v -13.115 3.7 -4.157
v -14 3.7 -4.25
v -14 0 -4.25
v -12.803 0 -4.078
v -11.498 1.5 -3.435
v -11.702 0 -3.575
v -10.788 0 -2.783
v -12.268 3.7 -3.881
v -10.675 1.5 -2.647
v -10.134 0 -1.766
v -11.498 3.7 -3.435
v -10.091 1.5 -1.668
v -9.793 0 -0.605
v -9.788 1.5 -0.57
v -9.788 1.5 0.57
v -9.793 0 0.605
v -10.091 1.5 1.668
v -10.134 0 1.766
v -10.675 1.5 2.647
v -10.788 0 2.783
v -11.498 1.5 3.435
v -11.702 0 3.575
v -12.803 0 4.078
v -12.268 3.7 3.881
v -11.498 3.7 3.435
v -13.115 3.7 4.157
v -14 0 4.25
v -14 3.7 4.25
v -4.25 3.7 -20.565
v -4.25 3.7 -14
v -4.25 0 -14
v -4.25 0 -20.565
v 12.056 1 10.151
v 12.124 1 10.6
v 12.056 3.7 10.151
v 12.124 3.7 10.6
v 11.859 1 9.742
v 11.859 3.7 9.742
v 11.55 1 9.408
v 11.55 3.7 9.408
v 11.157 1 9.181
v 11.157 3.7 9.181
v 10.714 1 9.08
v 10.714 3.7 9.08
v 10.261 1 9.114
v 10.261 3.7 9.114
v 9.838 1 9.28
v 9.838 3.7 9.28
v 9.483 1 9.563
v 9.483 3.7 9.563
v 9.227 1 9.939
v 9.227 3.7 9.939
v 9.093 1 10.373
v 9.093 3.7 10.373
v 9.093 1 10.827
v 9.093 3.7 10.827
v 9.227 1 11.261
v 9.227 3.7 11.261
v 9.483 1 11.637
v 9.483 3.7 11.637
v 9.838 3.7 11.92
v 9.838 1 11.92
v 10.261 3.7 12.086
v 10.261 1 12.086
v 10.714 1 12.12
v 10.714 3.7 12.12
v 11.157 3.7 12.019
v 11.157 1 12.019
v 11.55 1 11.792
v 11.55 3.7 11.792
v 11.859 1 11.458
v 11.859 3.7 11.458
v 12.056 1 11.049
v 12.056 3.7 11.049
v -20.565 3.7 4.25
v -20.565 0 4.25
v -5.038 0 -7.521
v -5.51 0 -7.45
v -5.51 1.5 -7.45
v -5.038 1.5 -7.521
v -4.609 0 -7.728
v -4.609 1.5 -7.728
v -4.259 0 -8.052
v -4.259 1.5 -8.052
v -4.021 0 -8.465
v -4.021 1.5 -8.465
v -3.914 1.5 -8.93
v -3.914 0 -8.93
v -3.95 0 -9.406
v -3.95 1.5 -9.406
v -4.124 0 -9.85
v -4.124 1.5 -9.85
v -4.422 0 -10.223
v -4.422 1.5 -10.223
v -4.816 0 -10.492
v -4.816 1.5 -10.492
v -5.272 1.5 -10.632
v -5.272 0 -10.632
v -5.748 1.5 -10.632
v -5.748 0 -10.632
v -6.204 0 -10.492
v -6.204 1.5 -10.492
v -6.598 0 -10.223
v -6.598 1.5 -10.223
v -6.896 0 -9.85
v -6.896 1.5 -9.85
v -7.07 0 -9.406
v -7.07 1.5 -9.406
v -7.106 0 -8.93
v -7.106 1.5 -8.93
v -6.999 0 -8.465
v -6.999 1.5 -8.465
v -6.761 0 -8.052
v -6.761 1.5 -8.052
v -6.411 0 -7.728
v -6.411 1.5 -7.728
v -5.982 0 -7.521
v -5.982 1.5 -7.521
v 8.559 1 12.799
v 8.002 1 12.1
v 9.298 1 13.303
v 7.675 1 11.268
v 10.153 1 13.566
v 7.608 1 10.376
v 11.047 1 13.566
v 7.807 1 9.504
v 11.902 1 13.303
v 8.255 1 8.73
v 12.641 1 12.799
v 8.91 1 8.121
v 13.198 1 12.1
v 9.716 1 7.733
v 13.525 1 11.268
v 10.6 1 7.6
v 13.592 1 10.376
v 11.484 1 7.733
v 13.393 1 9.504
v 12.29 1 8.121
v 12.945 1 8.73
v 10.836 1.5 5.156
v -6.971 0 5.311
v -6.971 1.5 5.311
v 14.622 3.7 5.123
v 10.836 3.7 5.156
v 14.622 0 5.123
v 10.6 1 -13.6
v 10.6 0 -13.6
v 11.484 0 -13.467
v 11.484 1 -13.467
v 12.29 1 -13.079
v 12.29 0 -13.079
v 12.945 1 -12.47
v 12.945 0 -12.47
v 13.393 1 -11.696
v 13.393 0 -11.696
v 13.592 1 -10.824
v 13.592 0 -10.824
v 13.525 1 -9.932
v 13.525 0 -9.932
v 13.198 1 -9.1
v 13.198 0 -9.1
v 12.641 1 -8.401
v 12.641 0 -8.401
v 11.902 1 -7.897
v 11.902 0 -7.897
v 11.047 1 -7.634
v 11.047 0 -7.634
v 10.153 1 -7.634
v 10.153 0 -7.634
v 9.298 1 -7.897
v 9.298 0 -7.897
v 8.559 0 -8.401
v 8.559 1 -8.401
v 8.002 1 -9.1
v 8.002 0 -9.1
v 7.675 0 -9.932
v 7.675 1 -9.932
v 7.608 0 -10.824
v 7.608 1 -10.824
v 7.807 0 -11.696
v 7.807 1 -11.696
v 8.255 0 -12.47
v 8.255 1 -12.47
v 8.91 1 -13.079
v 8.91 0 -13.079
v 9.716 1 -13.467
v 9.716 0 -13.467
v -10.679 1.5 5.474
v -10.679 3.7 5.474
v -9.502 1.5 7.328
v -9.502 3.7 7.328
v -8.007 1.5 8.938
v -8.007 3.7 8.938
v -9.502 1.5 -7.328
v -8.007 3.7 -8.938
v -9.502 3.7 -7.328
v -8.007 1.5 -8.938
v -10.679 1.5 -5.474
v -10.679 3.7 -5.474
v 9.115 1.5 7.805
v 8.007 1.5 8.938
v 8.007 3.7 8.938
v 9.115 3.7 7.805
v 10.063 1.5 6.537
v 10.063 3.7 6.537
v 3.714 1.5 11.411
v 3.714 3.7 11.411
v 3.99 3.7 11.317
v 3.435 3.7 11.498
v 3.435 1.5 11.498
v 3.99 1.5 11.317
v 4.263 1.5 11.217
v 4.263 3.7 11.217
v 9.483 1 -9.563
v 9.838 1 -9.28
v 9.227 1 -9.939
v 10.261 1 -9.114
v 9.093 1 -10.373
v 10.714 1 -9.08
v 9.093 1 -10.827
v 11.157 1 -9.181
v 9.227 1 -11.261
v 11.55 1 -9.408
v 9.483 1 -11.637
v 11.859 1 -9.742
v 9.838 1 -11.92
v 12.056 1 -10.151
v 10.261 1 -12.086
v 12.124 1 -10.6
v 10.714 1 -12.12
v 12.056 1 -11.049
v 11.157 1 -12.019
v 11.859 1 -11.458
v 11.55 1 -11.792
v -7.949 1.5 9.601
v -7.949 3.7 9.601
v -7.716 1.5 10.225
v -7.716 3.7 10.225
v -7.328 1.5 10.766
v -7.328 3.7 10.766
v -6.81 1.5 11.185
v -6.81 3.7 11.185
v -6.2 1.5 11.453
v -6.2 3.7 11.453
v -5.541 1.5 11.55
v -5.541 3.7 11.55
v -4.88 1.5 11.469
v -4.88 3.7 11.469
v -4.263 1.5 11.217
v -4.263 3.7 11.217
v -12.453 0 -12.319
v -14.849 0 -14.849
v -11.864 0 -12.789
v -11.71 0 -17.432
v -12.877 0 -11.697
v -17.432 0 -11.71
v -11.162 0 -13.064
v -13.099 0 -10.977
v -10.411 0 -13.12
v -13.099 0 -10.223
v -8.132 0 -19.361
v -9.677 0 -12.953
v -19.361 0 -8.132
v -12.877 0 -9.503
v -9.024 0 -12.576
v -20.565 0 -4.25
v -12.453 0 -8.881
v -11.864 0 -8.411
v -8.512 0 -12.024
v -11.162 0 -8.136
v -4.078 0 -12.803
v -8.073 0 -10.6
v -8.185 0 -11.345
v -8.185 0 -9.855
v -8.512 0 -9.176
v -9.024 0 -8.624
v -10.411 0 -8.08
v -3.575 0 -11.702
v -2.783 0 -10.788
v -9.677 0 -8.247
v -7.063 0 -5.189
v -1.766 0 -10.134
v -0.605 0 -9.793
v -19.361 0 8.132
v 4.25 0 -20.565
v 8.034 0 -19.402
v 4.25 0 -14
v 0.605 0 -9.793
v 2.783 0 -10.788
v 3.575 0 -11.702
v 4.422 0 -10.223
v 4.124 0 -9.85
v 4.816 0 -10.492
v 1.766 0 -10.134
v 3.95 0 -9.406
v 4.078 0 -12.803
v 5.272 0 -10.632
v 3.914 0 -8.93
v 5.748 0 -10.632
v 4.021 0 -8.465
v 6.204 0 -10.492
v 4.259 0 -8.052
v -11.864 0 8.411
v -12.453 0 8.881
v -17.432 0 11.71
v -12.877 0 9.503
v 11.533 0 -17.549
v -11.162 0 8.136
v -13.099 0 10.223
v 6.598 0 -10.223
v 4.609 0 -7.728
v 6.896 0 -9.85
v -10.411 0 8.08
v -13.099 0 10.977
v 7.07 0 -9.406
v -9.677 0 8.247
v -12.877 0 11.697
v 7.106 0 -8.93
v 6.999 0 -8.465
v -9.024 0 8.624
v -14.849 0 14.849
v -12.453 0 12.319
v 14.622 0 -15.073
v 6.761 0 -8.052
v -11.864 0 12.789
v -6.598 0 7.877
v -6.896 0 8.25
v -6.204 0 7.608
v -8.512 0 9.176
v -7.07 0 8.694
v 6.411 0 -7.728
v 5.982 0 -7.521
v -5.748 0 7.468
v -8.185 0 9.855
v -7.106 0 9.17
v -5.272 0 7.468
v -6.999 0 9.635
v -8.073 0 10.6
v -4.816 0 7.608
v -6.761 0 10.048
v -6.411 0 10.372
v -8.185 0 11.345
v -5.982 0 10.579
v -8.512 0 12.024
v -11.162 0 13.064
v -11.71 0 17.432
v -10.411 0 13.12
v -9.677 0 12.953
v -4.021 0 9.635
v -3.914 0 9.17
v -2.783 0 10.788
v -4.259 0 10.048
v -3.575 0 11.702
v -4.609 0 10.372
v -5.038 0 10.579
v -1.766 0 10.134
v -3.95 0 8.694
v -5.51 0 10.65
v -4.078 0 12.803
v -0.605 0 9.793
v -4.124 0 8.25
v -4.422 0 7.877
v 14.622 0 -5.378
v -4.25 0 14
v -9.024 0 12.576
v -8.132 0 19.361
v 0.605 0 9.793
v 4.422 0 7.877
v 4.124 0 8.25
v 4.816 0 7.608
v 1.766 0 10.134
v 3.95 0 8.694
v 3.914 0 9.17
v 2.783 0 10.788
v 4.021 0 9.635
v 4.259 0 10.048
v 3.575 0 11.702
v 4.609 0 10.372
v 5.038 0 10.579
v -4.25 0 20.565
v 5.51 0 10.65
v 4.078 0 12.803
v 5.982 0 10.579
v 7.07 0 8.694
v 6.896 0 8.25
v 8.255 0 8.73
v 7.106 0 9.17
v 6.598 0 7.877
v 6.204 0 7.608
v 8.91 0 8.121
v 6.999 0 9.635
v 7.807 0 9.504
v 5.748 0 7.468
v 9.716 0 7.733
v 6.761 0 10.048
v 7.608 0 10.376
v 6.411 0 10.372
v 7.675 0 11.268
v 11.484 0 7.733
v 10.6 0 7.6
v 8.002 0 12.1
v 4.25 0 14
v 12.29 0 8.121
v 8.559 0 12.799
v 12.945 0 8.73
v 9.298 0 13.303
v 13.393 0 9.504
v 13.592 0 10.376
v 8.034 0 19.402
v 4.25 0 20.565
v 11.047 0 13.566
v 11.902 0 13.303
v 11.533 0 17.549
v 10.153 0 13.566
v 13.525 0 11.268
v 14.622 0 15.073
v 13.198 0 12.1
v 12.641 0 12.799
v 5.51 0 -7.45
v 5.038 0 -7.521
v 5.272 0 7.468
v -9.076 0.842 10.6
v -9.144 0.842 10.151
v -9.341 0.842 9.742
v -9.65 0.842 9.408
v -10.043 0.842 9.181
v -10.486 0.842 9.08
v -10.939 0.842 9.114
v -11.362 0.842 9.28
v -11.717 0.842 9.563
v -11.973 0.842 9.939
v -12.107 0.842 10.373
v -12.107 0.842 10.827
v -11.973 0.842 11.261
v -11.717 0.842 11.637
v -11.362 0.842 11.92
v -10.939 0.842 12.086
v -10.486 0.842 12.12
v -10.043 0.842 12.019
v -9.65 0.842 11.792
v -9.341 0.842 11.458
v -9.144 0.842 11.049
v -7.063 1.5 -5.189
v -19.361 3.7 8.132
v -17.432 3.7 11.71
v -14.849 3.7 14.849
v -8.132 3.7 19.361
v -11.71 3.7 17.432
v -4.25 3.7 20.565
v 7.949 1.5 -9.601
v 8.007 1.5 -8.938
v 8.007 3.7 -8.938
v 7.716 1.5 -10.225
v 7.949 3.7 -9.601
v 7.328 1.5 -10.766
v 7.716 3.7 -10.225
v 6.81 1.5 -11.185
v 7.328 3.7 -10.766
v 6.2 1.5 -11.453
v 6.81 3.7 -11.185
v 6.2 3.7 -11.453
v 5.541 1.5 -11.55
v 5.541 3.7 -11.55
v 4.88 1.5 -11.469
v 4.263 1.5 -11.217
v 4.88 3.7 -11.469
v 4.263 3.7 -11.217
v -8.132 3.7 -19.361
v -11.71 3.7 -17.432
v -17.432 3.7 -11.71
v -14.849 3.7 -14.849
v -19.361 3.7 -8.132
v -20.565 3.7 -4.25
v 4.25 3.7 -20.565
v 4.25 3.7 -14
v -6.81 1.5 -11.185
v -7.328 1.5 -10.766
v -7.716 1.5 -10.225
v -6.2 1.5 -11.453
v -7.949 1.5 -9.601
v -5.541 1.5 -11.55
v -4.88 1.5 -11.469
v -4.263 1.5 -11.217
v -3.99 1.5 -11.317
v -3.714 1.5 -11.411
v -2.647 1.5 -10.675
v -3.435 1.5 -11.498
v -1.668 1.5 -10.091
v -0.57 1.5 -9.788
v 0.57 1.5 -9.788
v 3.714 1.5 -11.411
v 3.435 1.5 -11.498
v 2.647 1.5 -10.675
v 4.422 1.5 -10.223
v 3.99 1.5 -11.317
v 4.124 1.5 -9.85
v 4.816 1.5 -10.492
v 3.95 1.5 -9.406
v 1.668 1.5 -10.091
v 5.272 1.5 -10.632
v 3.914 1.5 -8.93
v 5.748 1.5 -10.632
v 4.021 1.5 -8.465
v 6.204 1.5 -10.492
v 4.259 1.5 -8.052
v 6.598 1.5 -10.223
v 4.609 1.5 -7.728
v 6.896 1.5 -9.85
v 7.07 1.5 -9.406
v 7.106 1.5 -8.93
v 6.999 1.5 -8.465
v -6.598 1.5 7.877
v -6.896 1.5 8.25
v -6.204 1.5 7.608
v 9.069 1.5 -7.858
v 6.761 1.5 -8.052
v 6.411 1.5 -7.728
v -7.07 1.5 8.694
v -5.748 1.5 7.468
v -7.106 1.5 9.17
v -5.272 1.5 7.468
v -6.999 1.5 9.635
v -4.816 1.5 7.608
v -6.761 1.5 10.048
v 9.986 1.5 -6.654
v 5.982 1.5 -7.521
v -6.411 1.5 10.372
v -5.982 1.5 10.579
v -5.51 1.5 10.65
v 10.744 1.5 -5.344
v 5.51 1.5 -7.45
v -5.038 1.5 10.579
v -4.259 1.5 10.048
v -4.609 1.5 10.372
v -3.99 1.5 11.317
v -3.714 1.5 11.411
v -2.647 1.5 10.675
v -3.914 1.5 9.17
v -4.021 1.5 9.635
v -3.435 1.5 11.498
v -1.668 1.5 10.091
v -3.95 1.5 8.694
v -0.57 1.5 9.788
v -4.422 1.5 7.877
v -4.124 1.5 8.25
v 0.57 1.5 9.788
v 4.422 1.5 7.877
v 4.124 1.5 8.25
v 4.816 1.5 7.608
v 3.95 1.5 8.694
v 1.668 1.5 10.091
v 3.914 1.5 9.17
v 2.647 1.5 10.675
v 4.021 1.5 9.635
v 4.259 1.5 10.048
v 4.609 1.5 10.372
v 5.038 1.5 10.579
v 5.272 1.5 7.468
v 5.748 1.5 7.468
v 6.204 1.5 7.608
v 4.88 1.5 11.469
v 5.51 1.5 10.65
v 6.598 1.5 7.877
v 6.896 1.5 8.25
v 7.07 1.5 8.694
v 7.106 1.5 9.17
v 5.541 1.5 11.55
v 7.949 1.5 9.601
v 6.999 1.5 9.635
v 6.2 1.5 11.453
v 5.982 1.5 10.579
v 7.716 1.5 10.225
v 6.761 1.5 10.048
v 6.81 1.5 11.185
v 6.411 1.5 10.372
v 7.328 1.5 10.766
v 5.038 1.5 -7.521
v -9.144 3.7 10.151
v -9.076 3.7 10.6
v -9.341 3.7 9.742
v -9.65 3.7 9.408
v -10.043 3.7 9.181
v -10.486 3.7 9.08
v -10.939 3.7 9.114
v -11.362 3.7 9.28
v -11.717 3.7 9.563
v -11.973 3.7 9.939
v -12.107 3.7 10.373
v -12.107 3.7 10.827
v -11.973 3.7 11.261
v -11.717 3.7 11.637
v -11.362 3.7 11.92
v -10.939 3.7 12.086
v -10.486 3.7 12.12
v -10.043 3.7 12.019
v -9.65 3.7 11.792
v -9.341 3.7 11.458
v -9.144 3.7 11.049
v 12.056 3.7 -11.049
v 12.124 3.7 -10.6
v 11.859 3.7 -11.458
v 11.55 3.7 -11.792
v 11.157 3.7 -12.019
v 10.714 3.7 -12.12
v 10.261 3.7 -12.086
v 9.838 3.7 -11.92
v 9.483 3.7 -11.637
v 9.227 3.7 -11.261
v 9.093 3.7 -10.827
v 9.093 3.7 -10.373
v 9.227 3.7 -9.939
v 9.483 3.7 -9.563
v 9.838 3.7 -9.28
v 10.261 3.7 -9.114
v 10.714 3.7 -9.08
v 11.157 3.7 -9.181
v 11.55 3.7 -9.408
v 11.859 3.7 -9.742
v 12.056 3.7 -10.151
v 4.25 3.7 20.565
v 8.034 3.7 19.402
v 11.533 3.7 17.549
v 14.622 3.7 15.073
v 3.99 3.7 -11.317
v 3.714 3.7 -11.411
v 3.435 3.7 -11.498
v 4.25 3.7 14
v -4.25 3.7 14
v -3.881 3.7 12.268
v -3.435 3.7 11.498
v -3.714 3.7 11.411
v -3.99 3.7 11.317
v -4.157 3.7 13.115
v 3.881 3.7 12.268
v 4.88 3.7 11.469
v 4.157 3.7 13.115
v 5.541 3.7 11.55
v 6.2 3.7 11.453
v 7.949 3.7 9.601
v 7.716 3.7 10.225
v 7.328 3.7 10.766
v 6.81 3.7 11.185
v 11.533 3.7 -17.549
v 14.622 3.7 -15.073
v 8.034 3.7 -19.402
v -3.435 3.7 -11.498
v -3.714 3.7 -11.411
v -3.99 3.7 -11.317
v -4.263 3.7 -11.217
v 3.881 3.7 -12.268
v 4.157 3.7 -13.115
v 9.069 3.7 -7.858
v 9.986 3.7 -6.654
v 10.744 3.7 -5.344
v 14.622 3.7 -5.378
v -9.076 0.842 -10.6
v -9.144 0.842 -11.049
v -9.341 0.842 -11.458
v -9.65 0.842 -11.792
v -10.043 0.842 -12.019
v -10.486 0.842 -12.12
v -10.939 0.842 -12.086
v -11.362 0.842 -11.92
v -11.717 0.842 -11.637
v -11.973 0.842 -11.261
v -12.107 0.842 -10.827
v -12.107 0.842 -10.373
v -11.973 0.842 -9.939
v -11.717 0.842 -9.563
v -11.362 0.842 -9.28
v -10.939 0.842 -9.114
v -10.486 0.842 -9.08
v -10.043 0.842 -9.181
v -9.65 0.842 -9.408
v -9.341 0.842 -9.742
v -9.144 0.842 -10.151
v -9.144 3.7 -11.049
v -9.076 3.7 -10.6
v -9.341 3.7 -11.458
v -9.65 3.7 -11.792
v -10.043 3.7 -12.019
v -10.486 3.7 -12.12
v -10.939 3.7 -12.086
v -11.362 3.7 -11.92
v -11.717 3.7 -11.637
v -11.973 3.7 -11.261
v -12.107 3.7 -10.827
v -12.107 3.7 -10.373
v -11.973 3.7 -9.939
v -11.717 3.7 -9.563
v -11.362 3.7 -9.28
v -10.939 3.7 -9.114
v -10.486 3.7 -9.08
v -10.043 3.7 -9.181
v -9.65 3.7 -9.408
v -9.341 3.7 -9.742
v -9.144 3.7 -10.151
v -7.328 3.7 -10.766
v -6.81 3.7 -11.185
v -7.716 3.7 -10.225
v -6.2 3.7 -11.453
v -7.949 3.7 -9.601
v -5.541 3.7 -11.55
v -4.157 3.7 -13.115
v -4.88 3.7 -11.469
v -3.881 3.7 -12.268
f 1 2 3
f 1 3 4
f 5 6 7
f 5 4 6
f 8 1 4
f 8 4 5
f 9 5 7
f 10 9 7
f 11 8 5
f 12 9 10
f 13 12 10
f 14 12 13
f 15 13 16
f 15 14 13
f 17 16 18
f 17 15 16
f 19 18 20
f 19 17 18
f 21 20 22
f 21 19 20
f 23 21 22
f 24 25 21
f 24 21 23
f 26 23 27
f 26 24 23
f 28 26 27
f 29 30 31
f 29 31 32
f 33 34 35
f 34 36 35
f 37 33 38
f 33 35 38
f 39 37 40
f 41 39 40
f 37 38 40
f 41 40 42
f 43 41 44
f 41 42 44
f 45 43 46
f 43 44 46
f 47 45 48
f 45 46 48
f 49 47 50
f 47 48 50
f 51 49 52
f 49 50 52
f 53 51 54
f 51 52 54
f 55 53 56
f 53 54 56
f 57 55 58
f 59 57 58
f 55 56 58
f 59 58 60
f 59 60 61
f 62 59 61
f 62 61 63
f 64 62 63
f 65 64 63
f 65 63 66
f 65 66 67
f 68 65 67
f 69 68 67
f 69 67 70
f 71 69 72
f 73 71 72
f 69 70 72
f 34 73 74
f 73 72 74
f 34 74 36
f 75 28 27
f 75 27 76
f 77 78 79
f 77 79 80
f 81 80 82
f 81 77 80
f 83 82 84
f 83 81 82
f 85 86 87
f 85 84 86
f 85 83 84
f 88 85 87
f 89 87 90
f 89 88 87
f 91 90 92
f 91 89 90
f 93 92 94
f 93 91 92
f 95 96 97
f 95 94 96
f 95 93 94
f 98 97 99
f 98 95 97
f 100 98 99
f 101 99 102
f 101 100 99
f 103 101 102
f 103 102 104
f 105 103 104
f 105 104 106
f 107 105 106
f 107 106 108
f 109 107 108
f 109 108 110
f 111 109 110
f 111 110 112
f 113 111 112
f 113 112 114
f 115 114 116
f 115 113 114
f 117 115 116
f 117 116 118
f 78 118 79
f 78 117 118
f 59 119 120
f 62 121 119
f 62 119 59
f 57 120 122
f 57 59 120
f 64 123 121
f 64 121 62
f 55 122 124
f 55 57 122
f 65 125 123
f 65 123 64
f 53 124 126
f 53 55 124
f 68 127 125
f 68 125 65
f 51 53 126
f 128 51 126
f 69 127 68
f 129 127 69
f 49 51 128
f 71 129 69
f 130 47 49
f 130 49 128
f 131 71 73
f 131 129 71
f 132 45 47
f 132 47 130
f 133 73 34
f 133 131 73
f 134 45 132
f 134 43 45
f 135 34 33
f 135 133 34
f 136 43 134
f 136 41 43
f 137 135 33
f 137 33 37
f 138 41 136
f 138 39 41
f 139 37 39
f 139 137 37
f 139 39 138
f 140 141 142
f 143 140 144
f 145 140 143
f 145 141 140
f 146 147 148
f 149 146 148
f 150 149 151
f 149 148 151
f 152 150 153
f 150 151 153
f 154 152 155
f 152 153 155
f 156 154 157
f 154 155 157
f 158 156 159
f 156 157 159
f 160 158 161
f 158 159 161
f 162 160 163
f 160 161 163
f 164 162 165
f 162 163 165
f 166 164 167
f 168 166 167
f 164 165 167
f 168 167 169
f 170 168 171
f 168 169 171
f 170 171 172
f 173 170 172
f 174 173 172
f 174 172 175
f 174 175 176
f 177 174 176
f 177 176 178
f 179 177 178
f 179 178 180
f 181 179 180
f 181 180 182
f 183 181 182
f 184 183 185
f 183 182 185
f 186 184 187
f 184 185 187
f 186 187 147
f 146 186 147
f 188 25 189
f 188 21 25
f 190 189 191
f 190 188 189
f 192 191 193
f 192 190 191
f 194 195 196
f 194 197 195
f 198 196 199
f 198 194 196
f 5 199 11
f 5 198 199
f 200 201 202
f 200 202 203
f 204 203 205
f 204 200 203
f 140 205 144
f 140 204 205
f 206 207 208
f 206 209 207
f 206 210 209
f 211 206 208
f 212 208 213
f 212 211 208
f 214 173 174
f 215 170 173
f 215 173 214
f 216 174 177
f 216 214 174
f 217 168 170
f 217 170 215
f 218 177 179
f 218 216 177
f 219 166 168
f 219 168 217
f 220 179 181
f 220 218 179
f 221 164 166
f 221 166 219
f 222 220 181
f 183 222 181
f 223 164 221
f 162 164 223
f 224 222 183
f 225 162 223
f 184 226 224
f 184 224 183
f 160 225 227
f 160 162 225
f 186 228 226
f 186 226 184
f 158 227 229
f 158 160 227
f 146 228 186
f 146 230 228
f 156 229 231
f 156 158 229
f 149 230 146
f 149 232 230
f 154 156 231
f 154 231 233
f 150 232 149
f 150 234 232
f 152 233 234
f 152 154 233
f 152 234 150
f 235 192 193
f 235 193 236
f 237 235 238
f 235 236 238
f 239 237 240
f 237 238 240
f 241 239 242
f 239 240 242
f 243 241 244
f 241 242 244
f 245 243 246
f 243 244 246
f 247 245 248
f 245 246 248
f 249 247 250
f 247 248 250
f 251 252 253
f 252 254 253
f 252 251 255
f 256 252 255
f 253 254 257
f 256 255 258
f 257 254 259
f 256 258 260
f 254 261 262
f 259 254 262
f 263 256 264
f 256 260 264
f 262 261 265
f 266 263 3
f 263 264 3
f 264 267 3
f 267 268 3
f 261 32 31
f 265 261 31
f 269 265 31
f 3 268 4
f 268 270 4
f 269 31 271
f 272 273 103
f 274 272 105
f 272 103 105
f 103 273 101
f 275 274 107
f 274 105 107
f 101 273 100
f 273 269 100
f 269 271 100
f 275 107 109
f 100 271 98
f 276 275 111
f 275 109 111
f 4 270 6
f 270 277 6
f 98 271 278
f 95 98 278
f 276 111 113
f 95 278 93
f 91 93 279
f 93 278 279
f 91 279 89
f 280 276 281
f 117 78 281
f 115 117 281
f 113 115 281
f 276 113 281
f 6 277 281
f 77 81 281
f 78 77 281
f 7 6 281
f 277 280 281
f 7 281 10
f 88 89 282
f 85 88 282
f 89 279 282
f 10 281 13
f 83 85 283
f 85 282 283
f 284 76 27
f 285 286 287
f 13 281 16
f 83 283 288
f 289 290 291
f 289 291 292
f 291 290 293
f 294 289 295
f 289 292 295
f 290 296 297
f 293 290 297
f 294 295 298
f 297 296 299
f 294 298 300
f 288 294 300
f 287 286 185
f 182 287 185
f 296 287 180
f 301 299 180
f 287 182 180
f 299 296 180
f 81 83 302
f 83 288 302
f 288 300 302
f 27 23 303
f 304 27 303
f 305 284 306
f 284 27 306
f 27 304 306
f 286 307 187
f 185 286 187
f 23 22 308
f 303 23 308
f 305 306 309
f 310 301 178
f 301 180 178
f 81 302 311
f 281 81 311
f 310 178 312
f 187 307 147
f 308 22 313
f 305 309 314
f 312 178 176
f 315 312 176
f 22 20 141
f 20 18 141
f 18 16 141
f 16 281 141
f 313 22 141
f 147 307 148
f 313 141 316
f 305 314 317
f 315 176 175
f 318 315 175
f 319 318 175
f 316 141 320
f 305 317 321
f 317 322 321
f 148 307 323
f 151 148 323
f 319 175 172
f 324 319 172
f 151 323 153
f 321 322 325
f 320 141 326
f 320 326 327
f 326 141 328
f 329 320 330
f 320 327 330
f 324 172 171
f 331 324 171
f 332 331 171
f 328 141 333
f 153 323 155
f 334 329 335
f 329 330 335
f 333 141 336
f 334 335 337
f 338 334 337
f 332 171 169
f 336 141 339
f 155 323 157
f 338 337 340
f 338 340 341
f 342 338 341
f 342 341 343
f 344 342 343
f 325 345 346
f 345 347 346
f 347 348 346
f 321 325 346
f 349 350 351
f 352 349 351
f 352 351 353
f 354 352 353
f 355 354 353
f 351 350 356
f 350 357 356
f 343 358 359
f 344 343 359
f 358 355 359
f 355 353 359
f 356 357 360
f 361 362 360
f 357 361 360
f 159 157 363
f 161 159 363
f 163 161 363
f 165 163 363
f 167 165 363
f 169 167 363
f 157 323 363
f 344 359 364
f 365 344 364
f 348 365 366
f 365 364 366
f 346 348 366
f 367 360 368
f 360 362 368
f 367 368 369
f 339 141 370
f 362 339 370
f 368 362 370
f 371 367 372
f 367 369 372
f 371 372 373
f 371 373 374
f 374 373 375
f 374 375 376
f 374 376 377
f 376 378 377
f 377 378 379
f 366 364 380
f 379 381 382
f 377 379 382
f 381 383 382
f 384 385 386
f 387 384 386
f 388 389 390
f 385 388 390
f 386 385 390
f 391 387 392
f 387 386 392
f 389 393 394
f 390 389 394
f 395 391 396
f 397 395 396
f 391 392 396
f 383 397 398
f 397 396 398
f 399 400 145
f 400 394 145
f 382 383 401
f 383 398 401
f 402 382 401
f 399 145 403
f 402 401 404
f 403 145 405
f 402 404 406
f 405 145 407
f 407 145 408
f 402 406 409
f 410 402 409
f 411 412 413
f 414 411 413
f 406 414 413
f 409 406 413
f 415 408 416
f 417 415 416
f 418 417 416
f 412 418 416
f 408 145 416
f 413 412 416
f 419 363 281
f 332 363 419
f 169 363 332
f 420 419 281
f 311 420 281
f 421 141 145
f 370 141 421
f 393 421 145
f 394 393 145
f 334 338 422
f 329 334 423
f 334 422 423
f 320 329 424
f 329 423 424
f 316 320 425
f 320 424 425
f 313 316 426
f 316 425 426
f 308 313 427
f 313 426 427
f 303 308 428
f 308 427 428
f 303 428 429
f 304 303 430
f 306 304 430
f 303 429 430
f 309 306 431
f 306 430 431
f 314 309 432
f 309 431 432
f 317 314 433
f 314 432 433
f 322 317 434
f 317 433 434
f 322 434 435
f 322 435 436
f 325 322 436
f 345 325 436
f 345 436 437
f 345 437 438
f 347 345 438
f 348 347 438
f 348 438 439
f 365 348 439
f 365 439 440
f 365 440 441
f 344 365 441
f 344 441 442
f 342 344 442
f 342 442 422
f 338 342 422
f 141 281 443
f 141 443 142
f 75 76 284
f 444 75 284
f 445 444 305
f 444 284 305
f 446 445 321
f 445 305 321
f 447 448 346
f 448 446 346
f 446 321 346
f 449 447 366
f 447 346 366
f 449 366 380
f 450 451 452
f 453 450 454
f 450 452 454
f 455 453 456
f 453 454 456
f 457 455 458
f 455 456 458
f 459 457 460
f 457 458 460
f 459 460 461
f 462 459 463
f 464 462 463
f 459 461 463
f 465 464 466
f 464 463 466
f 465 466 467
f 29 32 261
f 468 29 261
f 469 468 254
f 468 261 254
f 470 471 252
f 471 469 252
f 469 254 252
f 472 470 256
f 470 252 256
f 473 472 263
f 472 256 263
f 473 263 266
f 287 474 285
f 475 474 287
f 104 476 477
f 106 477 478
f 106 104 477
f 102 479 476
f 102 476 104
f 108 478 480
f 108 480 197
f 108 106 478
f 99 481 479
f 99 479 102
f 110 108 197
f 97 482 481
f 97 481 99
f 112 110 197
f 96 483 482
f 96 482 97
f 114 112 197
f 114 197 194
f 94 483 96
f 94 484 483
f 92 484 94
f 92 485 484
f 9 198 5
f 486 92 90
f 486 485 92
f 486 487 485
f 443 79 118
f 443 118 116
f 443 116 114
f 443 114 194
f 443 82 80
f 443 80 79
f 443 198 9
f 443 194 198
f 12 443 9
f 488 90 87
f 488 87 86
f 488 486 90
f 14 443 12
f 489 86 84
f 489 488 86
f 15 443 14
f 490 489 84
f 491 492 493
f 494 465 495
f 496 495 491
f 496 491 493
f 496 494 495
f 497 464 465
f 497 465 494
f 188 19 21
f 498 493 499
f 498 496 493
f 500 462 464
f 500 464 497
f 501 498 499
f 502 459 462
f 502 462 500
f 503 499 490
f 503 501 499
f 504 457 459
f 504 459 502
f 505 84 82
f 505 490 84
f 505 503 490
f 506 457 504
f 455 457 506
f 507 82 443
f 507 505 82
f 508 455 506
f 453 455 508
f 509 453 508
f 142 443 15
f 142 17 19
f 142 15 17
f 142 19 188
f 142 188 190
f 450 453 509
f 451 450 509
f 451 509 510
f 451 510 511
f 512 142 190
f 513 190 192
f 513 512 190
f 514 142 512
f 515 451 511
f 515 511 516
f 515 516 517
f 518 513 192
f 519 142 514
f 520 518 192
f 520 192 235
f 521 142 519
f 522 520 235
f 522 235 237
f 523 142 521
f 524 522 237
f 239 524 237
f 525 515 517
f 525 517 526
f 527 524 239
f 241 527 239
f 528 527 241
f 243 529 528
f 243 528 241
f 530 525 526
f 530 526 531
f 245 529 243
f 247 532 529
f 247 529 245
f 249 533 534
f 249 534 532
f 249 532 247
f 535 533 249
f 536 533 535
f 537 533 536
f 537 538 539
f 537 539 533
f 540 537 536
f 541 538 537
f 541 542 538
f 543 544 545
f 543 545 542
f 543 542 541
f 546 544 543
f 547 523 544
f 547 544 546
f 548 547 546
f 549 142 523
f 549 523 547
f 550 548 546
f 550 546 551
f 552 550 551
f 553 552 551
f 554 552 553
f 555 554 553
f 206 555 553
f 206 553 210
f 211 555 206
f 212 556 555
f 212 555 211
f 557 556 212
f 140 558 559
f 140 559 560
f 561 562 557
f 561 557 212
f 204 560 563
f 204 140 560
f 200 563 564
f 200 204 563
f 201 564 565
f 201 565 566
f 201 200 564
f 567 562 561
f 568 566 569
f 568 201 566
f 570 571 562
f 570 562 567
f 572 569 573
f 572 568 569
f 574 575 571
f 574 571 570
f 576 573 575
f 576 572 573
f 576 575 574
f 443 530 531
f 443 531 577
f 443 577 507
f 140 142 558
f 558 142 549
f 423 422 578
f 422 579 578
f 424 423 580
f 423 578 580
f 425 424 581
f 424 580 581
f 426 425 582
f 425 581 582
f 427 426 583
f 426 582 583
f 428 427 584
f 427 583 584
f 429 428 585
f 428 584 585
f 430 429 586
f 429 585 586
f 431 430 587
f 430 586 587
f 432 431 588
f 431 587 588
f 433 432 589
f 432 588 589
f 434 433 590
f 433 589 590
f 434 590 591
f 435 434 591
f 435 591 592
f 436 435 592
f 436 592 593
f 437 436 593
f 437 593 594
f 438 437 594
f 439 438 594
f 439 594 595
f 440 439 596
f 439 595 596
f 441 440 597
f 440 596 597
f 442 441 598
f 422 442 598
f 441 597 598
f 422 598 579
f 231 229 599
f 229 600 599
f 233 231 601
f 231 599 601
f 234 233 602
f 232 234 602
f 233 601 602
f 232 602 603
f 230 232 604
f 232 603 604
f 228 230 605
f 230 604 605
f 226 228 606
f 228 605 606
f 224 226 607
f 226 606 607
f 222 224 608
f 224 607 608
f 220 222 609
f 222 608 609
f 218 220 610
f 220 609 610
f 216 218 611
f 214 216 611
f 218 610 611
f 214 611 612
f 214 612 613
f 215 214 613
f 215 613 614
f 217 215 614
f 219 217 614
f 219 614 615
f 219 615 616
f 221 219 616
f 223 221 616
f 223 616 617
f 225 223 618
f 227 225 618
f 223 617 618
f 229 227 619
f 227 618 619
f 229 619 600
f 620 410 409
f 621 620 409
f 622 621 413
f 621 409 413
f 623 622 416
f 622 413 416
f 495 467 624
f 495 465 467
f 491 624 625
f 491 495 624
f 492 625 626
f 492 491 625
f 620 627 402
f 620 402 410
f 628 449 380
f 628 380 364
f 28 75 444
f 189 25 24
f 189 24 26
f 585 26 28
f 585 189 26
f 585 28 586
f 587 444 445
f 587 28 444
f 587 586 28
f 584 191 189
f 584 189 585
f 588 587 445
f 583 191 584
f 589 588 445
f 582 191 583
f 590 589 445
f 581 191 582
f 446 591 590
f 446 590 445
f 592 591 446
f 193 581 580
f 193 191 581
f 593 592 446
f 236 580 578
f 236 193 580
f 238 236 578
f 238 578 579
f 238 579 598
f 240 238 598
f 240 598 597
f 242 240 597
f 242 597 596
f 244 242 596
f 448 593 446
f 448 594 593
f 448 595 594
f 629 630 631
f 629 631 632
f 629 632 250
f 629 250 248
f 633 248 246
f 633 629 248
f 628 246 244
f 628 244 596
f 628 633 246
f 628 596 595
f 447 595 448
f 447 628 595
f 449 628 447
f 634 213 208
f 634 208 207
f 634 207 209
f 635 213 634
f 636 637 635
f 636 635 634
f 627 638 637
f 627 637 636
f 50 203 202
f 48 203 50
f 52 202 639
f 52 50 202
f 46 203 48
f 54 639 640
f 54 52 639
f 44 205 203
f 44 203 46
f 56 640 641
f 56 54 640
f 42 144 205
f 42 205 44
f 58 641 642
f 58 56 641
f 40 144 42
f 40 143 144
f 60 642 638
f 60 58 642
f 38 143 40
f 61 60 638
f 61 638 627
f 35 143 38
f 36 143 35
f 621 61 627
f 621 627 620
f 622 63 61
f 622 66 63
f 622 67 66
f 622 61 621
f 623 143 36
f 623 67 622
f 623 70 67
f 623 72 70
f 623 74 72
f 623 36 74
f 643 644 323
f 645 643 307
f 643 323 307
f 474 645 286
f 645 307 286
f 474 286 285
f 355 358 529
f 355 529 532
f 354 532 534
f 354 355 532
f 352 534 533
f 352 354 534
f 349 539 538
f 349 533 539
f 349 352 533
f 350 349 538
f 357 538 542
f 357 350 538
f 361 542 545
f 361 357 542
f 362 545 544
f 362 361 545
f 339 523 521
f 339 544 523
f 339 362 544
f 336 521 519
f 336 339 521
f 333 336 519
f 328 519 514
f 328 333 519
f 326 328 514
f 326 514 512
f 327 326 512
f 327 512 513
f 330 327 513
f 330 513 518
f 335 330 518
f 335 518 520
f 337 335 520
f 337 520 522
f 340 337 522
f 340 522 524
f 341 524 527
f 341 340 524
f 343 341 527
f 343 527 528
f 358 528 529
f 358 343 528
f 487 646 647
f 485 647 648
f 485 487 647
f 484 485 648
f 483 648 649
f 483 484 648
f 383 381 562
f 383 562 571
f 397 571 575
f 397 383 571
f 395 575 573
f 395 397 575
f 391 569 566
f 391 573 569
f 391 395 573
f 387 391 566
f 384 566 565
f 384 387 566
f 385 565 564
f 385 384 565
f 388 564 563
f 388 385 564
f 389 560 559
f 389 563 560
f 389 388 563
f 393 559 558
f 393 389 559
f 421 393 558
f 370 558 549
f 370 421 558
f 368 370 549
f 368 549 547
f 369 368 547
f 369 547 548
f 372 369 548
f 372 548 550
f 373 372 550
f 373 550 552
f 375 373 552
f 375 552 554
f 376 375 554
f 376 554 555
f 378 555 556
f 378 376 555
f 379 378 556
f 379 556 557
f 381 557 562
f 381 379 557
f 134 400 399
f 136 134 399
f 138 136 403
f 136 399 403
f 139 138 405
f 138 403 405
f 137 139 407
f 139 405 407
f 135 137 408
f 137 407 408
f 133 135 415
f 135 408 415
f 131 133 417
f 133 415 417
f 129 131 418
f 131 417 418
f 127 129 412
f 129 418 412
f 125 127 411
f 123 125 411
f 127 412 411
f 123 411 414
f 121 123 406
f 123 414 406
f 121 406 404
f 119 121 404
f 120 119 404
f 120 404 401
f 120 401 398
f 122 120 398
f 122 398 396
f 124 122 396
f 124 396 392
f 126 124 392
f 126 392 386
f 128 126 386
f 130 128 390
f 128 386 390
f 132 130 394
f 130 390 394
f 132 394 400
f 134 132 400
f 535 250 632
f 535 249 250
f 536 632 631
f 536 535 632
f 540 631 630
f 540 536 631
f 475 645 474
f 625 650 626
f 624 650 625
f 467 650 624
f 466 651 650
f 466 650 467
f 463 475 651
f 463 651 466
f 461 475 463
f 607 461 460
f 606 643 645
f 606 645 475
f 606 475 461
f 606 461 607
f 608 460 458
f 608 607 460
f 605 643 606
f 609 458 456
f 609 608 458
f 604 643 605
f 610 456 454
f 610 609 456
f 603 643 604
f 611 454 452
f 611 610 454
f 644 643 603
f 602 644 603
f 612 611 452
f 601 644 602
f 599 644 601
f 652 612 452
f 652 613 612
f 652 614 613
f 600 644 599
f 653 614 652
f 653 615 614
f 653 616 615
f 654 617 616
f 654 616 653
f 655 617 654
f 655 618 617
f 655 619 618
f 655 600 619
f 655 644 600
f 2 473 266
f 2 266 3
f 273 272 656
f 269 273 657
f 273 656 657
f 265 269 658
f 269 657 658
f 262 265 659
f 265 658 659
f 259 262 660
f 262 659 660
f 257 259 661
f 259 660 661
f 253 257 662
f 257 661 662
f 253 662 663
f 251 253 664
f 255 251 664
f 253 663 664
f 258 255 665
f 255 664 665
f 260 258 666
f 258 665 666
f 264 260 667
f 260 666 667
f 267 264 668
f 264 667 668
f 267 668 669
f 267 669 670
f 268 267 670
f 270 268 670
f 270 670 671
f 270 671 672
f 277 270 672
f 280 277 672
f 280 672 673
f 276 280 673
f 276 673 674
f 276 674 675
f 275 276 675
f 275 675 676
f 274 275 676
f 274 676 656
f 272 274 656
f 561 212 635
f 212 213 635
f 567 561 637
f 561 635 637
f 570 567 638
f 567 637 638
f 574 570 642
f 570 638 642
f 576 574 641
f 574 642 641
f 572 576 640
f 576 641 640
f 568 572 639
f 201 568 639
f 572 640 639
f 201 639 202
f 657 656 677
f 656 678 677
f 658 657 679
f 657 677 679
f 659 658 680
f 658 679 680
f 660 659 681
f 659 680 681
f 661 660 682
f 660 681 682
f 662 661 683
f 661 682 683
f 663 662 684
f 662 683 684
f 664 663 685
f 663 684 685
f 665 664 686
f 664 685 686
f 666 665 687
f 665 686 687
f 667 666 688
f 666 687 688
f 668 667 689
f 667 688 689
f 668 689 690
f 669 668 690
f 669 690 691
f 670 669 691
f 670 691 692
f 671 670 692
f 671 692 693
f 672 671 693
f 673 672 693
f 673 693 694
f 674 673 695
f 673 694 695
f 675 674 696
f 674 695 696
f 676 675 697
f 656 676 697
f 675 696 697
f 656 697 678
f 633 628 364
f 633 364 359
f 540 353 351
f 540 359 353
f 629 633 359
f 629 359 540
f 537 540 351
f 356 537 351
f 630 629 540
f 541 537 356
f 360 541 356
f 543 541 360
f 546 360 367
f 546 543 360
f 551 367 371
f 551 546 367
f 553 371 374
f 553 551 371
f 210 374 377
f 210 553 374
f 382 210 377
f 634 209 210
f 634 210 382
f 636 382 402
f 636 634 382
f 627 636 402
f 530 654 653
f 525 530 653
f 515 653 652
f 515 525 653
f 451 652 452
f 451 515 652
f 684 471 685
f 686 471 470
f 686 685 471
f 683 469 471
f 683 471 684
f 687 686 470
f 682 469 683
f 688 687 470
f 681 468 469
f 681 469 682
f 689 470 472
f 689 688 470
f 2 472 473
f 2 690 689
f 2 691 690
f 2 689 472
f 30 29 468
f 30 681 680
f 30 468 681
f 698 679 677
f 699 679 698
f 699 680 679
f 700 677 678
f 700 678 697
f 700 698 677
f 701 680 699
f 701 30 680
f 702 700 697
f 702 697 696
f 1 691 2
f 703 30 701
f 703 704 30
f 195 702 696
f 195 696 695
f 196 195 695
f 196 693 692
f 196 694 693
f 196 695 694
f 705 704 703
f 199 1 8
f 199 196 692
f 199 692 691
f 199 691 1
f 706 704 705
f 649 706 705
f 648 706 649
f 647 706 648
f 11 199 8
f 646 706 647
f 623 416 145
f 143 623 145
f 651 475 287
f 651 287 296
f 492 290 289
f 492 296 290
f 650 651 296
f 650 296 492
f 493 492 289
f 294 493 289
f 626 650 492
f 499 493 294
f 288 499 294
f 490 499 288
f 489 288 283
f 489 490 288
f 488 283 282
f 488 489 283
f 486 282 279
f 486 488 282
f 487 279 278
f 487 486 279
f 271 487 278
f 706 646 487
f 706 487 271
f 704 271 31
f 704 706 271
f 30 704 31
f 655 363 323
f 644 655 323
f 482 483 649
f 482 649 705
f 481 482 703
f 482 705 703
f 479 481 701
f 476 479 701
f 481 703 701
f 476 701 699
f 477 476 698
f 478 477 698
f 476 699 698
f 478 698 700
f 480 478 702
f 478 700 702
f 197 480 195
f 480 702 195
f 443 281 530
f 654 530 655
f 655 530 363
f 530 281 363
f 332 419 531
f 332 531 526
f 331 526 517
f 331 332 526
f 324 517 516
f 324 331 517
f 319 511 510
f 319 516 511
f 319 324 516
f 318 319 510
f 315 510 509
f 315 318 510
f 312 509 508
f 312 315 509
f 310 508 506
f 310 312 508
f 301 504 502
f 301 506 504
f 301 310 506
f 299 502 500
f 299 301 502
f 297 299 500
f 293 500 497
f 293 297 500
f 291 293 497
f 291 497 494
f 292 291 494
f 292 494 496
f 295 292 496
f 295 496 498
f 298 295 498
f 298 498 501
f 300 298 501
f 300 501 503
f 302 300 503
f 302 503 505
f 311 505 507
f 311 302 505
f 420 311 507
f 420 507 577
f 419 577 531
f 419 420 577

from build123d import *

# Parameters (mm, degrees)
SKETCH_1_R                      = 21
EXTRUDE_1_DEPTH                 = 1.5
SKETCH_2_R                      = 21
SKETCH_2_R_2                    = 12
EXTRUDE_2_DEPTH                 = 2.2
SKETCH_7_R                      = 1.25
CUT_EXTRUDE_5_DEPTH             = 30.92808046
SKETCH_8_W                      = 14.034551426
SKETCH_8_H                      = 10.5
CUT_EXTRUDE_6_DEPTH             = 30.92808046
SKETCH_9_W                      = 17.42220177
SKETCH_9_H                      = 10.5
CUT_EXTRUDE_7_DEPTH             = 30.92808046
MOVE_BODY_5_ANGLE               = 45
MOVE_BODY_6_ANGLE               = 5
SKETCH_15_R                     = 0.55
SKETCH_15_R_2                   = 0.5
CUT_EXTRUDE_9_DEPTH             = 30.92808046
MOVE_BODY_7_ANGLE               = 49.5
SKETCH_16_R                     = 1.35
CUT_EXTRUDE_10_DEPTH            = 1.5
SKETCH_17_R                     = 2.5
CUT_EXTRUDE_11_DEPTH            = 2.2
SKETCH_23_R                     = 2
CUT_EXTRUDE_17_DEPTH            = 30.92808046
CUT_EXTRUDE_18_DEPTH            = 30.779858965
CUT_EXTRUDE_18_DEPTH_BACK       = 30.779858965
SKETCH_24_R                     = 1.6
CUT_EXTRUDE_25_DEPTH            = 30.92808046
SKETCH_42_R                     = 3
CUT_EXTRUDE_26_DEPTH            = 1
HOLE_WIZARD_3_100_1_D           = 3.048
HOLE_WIZARD_3_100_1_CSINK_D     = 5.0546
HOLE_WIZARD_3_100_1_CSINK_ANGLE = 100
CUT_EXTRUDE_27_DEPTH            = 30.92808046


with BuildPart() as part:
    # 草图1 → 凸台-拉伸1 (new body)
    with BuildSketch(Plane(origin=(0, 0, 0), x_dir=(1, 0, 0), z_dir=(0, 1, 0))):
        with Locations(Location((0, 0, 0), (0, 0, 270))):
            Circle(SKETCH_1_R)
    extrude(amount=EXTRUDE_1_DEPTH)

    # 草图2 → 凸台-拉伸2 (add)
    with BuildSketch(Plane(origin=(0, 1.5, 0), x_dir=(1, 0, 0), z_dir=(0, 1, 0))):
        with Locations(Location((0, 0, 0), (0, 0, 270))):
            Circle(SKETCH_2_R)
        with Locations(Location((0, 0, 0), (0, 0, 270))):
            Circle(SKETCH_2_R_2, mode=Mode.SUBTRACT)
    extrude(amount=EXTRUDE_2_DEPTH)

    # 草图7 → 切除-拉伸5 (cut, through all)
    with BuildSketch(Plane.XZ):
        with Locations(Location((-5.51, 9.05, 0), (0, 0, 270))):
            Circle(SKETCH_7_R)
        with Locations(Location((5.51, 9.05, 0), (0, 0, 270))):
            Circle(SKETCH_7_R)
        with Locations(Location((-5.51, -9.05, 0), (0, 0, 270))):
            Circle(SKETCH_7_R)
        with Locations(Location((5.51, -9.05, 0), (0, 0, 270))):
            Circle(SKETCH_7_R)
    extrude(amount=-CUT_EXTRUDE_5_DEPTH, mode=Mode.SUBTRACT)

    # 草图8 → 切除-拉伸6 (cut, through all)
    with BuildSketch(Plane.XZ):
        Rectangle(SKETCH_8_W, SKETCH_8_H)
    extrude(amount=-CUT_EXTRUDE_6_DEPTH, mode=Mode.SUBTRACT)

    # 草图9 → 切除-拉伸7 (cut, through all)
    with BuildSketch(Plane.XZ):
        with Locations((15.728376598, 0)):
            Rectangle(SKETCH_9_W, SKETCH_9_H)
    extrude(amount=-CUT_EXTRUDE_7_DEPTH, mode=Mode.SUBTRACT)


with BuildPart() as part_1:
    # Move Body 5: moved
    add(part.part.rotate(Axis((0, 0, 0), (0, 1, 0)), MOVE_BODY_5_ANGLE))


with BuildPart() as part_2:
    # Move Body 6: moved
    add(part_1.part.rotate(Axis((0, 0, 0), (0, 1, 0)), MOVE_BODY_6_ANGLE))

    # 草图15 → 切除-拉伸9 (cut, through all)
    with BuildSketch(Plane.XZ):
        with Locations(Location((-10.9, 10.9, 0), (0, 0, 270))):
            Circle(SKETCH_15_R)
        with Locations(Location((10.9, 10.9, 0), (0, 0, 270))):
            Circle(SKETCH_15_R_2)
        with Locations(Location((-10.9, -10.9, 0), (0, 0, 270))):
            Circle(SKETCH_15_R_2)
    extrude(amount=-CUT_EXTRUDE_9_DEPTH, mode=Mode.SUBTRACT)


with BuildPart() as part_3:
    # Move Body 7: moved
    add(part_2.part.rotate(Axis((0, 0, 0), (0, -1, 0)), MOVE_BODY_7_ANGLE))

    # 草图16 → 切除-拉伸10 (cut)
    with BuildSketch(Plane.XZ):
        with Locations(Location((-5.51, 9.05, 0), (0, 0, 270))):
            Circle(SKETCH_16_R)
        with Locations(Location((5.51, 9.05, 0), (0, 0, 270))):
            Circle(SKETCH_16_R)
        with Locations(Location((-5.51, -9.05, 0), (0, 0, 270))):
            Circle(SKETCH_16_R)
        with Locations(Location((5.51, -9.05, 0), (0, 0, 270))):
            Circle(SKETCH_16_R)
    extrude(amount=-CUT_EXTRUDE_10_DEPTH, mode=Mode.SUBTRACT)

    # 草图17 → 切除-拉伸11 (cut)
    with BuildSketch(Plane(origin=(0, 3.7, 0), x_dir=(1, 0, 0), z_dir=(0, 1, 0))):
        with Locations((-5.51, 9.05)):
            Circle(SKETCH_17_R)
        with Locations((5.51, 9.05)):
            Circle(SKETCH_17_R)
        with Locations((-5.51, -9.05)):
            Circle(SKETCH_17_R)
        with Locations((5.51, -9.05)):
            Circle(SKETCH_17_R)
    extrude(amount=-CUT_EXTRUDE_11_DEPTH, mode=Mode.SUBTRACT)

    # 草图23 → 切除-拉伸17 (cut, through all)
    with BuildSketch(Plane(origin=(0, 3.7, 0), x_dir=(1, 0, 0), z_dir=(0, 1, 0))):
        with Locations(Location((0, 16, 0), (0, 0, 270))):
            Circle(SKETCH_23_R)
        with Locations(Location((-16, 0, 0), (0, 0, 270))):
            Circle(SKETCH_23_R)
        with Locations(Location((0, -16, 0), (0, 0, 270))):
            Circle(SKETCH_23_R)
    extrude(amount=-CUT_EXTRUDE_17_DEPTH, mode=Mode.SUBTRACT)

    # 草图24 → 切除-拉伸18 (cut, two sides: drawn at the far end of the back side and taken through both)
    with BuildSketch(Plane(origin=(0, 1.5, 0), x_dir=(1, 0, 0), z_dir=(0, 1, 0)).offset(-CUT_EXTRUDE_18_DEPTH_BACK)):
        with Locations(Location((-5.51, 9.05, 0), (0, 0, 270))):
            Circle(SKETCH_24_R)
        with Locations(Location((5.51, 9.05, 0), (0, 0, 270))):
            Circle(SKETCH_24_R)
        with Locations(Location((-5.51, -9.05, 0), (0, 0, 270))):
            Circle(SKETCH_24_R)
        with Locations(Location((5.51, -9.05, 0), (0, 0, 270))):
            Circle(SKETCH_24_R)
    extrude(amount=CUT_EXTRUDE_18_DEPTH + CUT_EXTRUDE_18_DEPTH_BACK, mode=Mode.SUBTRACT)

    # 草图37 → 切除-拉伸25 (cut, through all)
    with BuildSketch(Plane.XZ):
        with BuildLine():
            Line((24.72756624, 20.266700409), (14.622140931, 20.266700409))
            Line((14.622140931, 20.266700409), (14.622140931, 15.072922563))
            ThreePointArc((14.622140931, 15.072922563), (18.200516902, 10.47574267), (20.378202654, 5.072362031))
            Line((20.378202654, 5.072362031), (14.622140931, 5.122594421))
            Line((14.622140931, 5.122594421), (14.622140931, -5.377805402))
            Line((14.622140931, -5.377805402), (20.286574032, -5.427238161))
            ThreePointArc((20.286574032, -5.427238161), (18.108406942, -10.634171243), (14.622140931, -15.072922563))
            Line((14.622140931, -15.072922563), (14.622140931, -20.266073881))
            Line((14.622140931, -20.266073881), (24.72756624, -20.266073881))
            Line((24.72756624, -20.266073881), (24.72756624, 20.266700409))
        make_face()
        with BuildLine():
            ThreePointArc((20.378202654, 5.072362031), (18.200516902, 10.47574267), (14.622140931, 15.072922563))
            Line((14.622140931, 15.072922563), (14.622140931, 5.122594421))
            Line((14.622140931, 5.122594421), (20.378202654, 5.072362031))
        make_face()
        with BuildLine():
            Line((14.622140931, -5.377805402), (14.622140931, -15.072922563))
            ThreePointArc((14.622140931, -15.072922563), (18.108406942, -10.634171243), (20.286574032, -5.427238161))
            Line((20.286574032, -5.427238161), (14.622140931, -5.377805402))
        make_face()
    extrude(amount=-CUT_EXTRUDE_25_DEPTH, mode=Mode.SUBTRACT)

    # 草图42 → 切除-拉伸26 (cut)
    with BuildSketch(Plane(origin=(0, 0, 0), x_dir=(-1, 0, 0), z_dir=(0, -1, 0))):
        with Locations(Location((-10.6, -10.6, 0), (0, 0, 90))):
            Circle(SKETCH_42_R)
        with Locations(Location((-10.6, 10.6, 0), (0, 0, 90))):
            Circle(SKETCH_42_R)
    extrude(amount=-CUT_EXTRUDE_26_DEPTH, mode=Mode.SUBTRACT)

    # #3 平头机械螺钉的锥形沉头孔 (100)1 (through all)
    with Locations(Plane(origin=(0, 0, 0), x_dir=(-1, 0, 0), z_dir=(0, -1, 0))):
        with Locations((10.6, -10.6), (-10.6, -10.6), (10.6, 10.6), (-10.6, 10.6)):
            CounterSinkHole(HOLE_WIZARD_3_100_1_D / 2, HOLE_WIZARD_3_100_1_CSINK_D / 2, counter_sink_angle=HOLE_WIZARD_3_100_1_CSINK_ANGLE)

    # 草图45 → 切除-拉伸27 (cut, through all)
    with BuildSketch(Plane(origin=(0, 3.7, 0), x_dir=(1, 0, 0), z_dir=(0, 1, 0))):
        with BuildLine():
            Line((-33, 4.25), (-14, 4.25))
            ThreePointArc((-14, 4.25), (-9.75, 0), (-14, -4.25))
            Line((-14, -4.25), (-33, -4.25))
            ThreePointArc((-33, -4.25), (-37.25, 0), (-33, 4.25))
        make_face()
        with BuildLine():
            Line((4.25, 33), (4.25, 14))
            ThreePointArc((4.25, 14), (0, 9.75), (-4.25, 14))
            Line((-4.25, 14), (-4.25, 33))
            ThreePointArc((-4.25, 33), (0, 37.25), (4.25, 33))
        make_face()
        with BuildLine():
            Line((-4.25, -33), (-4.25, -14))
            ThreePointArc((-4.25, -14), (0, -9.75), (4.25, -14))
            Line((4.25, -14), (4.25, -33))
            ThreePointArc((4.25, -33), (0, -37.25), (-4.25, -33))
        make_face()
    extrude(amount=-CUT_EXTRUDE_27_DEPTH, mode=Mode.SUBTRACT)


solid = part_3.part
